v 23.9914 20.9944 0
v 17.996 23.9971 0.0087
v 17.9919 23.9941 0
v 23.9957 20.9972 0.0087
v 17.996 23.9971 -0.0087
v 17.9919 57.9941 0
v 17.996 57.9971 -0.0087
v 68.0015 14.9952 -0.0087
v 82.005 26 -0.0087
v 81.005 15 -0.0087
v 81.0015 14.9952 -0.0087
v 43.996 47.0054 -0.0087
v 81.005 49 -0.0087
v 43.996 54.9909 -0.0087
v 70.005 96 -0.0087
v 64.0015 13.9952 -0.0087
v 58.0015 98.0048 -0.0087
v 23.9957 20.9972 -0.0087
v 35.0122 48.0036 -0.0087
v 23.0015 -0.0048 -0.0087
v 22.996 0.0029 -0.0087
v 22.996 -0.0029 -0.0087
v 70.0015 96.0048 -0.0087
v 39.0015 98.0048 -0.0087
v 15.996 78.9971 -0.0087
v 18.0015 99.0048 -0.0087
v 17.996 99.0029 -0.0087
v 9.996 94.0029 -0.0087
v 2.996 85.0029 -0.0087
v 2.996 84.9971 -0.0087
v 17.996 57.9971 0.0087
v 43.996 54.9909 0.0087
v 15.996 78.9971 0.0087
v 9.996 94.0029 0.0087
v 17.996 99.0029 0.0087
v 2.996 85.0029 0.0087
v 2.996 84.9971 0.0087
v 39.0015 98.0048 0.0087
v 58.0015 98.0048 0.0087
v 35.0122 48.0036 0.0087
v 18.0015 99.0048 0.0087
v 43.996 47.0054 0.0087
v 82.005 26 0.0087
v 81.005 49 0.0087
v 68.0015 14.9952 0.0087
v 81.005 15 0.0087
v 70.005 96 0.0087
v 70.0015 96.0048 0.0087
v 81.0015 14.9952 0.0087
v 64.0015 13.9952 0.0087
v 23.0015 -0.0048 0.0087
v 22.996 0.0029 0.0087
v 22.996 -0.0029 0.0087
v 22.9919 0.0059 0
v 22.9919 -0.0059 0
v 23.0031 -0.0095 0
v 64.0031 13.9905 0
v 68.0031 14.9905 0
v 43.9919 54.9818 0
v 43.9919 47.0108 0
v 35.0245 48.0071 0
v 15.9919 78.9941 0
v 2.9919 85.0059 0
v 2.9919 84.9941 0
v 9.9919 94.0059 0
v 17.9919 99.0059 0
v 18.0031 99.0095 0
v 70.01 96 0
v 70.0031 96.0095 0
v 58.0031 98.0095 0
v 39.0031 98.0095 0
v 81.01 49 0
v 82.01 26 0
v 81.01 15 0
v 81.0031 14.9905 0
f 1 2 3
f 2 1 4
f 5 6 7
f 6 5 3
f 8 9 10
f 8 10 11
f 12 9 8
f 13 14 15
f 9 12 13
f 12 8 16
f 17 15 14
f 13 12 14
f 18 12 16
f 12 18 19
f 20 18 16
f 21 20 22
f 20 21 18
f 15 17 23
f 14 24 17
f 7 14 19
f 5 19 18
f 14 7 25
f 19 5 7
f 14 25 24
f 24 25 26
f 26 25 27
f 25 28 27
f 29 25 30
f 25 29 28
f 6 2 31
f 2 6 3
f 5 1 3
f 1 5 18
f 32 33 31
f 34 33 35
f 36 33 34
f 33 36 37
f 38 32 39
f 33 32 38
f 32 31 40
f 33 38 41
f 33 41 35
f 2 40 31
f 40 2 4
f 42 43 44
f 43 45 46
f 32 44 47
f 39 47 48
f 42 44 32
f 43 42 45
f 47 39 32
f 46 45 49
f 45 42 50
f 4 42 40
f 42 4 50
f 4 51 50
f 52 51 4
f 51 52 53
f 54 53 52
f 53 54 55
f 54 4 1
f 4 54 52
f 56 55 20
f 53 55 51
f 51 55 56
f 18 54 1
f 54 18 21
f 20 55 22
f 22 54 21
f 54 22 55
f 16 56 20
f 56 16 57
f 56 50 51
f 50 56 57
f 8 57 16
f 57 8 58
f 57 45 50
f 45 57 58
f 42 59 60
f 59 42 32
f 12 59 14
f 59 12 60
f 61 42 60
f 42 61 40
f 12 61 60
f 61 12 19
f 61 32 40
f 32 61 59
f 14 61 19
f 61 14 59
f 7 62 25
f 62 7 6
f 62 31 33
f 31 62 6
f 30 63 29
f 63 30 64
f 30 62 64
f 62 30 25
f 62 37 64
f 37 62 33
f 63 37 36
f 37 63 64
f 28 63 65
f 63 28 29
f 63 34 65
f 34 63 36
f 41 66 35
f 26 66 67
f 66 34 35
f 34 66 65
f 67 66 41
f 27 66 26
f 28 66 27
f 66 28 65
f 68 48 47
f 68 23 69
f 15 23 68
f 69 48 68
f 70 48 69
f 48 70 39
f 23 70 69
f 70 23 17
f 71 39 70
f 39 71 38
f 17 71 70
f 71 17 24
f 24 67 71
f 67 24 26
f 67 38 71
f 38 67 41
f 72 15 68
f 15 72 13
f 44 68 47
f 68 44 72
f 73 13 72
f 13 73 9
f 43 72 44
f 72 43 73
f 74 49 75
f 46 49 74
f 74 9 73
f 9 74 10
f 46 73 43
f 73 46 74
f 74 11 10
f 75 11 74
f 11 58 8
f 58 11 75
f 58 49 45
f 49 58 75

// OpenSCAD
color([0.5839405385485582,0.4048698908705002,0.6877557316706271]) hull(){
    translate([26,22]) sphere(0.01);
    translate([24,21]) sphere(0.01);
    translate([18,24]) sphere(0.01);
}
color([0.29310936231965135,0.08456113000314536,0.6409271470126323]) hull(){
    translate([23,0]) sphere(0.01);
    translate([24,21]) sphere(0.01);
    translate([26,22]) sphere(0.01);
}
color([0.38512246522478266,0.6162859510128613,0.407224705538046]) hull(){
    translate([23,0]) sphere(0.01);
    translate([26,22]) sphere(0.01);
    translate([42,29]) sphere(0.01);
}
color([0.6107800780239486,0.9541913078580654,0.09369719926319908]) hull(){
    translate([23,0]) sphere(0.01);
    translate([42,29]) sphere(0.01);
    translate([64,14]) sphere(0.01);
}
color([0.4396226851829427,0.9817497074141792,0.30111933510979894]) hull(){
    translate([64,14]) sphere(0.01);
    translate([42,29]) sphere(0.01);
    translate([58,33]) sphere(0.01);
}
color([0.08571041628526821,0.691130580335744,0.16573157374072334]) hull(){
    translate([64,14]) sphere(0.01);
    translate([58,33]) sphere(0.01);
    translate([68,15]) sphere(0.01);
}
color([0.4668304924867862,0.30100213617539295,0.3511677492745029]) hull(){
    translate([68,15]) sphere(0.01);
    translate([58,33]) sphere(0.01);
    translate([72,20]) sphere(0.01);
}
color([0.05564944269037686,0.7696481469448815,0.686275624239137]) hull(){
    translate([72,20]) sphere(0.01);
    translate([58,33]) sphere(0.01);
    translate([82,26]) sphere(0.01);
}
color([0.15447252119296884,0.35335085758162643,0.18799175914388588]) hull(){
    translate([82,26]) sphere(0.01);
    translate([58,33]) sphere(0.01);
    translate([77,50]) sphere(0.01);
}
color([0.41322879780265653,0.82270842281296,0.9057146612667819]) hull(){
    translate([58,33]) sphere(0.01);
    translate([44,55]) sphere(0.01);
    translate([77,50]) sphere(0.01);
}
color([0.9688547633127277,0.5528378273263655,0.12760284187612392]) hull(){
    translate([58,33]) sphere(0.01);
    translate([44,47]) sphere(0.01);
    translate([44,55]) sphere(0.01);
}
color([0.1710979555253146,0.7131998843266452,0.6397779425125977]) hull(){
    translate([58,33]) sphere(0.01);
    translate([42,29]) sphere(0.01);
    translate([44,47]) sphere(0.01);
}
color([0.57496968906483,0.8489371230716904,0.07944838941339594]) hull(){
    translate([42,29]) sphere(0.01);
    translate([35,48]) sphere(0.01);
    translate([44,47]) sphere(0.01);
}
color([0.040333123224873146,0.9305910632054132,0.3080440975445232]) hull(){
    translate([42,29]) sphere(0.01);
    translate([26,22]) sphere(0.01);
    translate([35,48]) sphere(0.01);
}
color([0.6084655882345898,0.4923441190446234,0.7069385087242315]) hull(){
    translate([26,22]) sphere(0.01);
    translate([26,51]) sphere(0.01);
    translate([35,48]) sphere(0.01);
}
color([0.6803385961846494,0.18024793645131376,0.10787678186317007]) hull(){
    translate([26,22]) sphere(0.01);
    translate([18,24]) sphere(0.01);
    translate([26,51]) sphere(0.01);
}
color([0.1335624130282893,0.47731112778056706,0.8393950916733898]) hull(){
    translate([18,24]) sphere(0.01);
    translate([18,58]) sphere(0.01);
    translate([26,51]) sphere(0.01);
}
color([0.6780893207968227,0.08337096158279222,0.27725115680544954]) hull(){
    translate([26,51]) sphere(0.01);
    translate([30,57]) sphere(0.01);
    translate([35,48]) sphere(0.01);
}
color([0.9965791662073833,0.03375154870506614,0.10494976972159242]) hull(){
    translate([26,51]) sphere(0.01);
    translate([18,58]) sphere(0.01);
    translate([30,57]) sphere(0.01);
}
color([0.516844917539197,0.1360610465034362,0.543805910213663]) hull(){
    translate([30,57]) sphere(0.01);
    translate([44,55]) sphere(0.01);
    translate([35,48]) sphere(0.01);
}
color([0.04901628196141694,0.4867102513994055,0.8813892002857401]) hull(){
    translate([18,58]) sphere(0.01);
    translate([16,79]) sphere(0.01);
    translate([30,57]) sphere(0.01);
}
color([0.3053751014353143,0.40772022041766365,0.31297204198076634]) hull(){
    translate([30,57]) sphere(0.01);
    translate([16,79]) sphere(0.01);
    translate([44,55]) sphere(0.01);
}
color([0.49907796034366436,0.6160709555012981,0.9916538905911245]) hull(){
    translate([16,79]) sphere(0.01);
    translate([20,83]) sphere(0.01);
    translate([44,55]) sphere(0.01);
}
color([0.3123575451593331,0.46364206475662195,0.8862899719975306]) hull(){
    translate([16,79]) sphere(0.01);
    translate([6,84]) sphere(0.01);
    translate([20,83]) sphere(0.01);
}
color([0.5738800220993816,0.8494037217359881,0.24323676398212035]) hull(){
    translate([16,79]) sphere(0.01);
    translate([3,85]) sphere(0.01);
    translate([6,84]) sphere(0.01);
}
color([0.8402878098664139,0.9530478541805099,0.16594803365564914]) hull(){
    translate([6,84]) sphere(0.01);
    translate([10,94]) sphere(0.01);
    translate([3,85]) sphere(0.01);
}
color([0.0023370868964924796,0.7387895340607371,0.5374530602666081]) hull(){
    translate([6,84]) sphere(0.01);
    translate([18,99]) sphere(0.01);
    translate([10,94]) sphere(0.01);
}
color([0.25604025835089217,0.4320068924153808,0.5112453323210508]) hull(){
    translate([6,84]) sphere(0.01);
    translate([22,90]) sphere(0.01);
    translate([18,99]) sphere(0.01);
}
color([0.7462272619347637,0.5039790716190428,0.8850839351693509]) hull(){
    translate([6,84]) sphere(0.01);
    translate([20,83]) sphere(0.01);
    translate([22,90]) sphere(0.01);
}
color([0.6652757233710683,0.22263754843686523,0.08942086350367451]) hull(){
    translate([20,83]) sphere(0.01);
    translate([50,93]) sphere(0.01);
    translate([22,90]) sphere(0.01);
}
color([0.6195232841458308,0.9036720387350747,0.7222923954673625]) hull(){
    translate([20,83]) sphere(0.01);
    translate([44,55]) sphere(0.01);
    translate([50,93]) sphere(0.01);
}
color([0.6665075097113882,0.5421139713900744,0.6943978877819516]) hull(){
    translate([44,55]) sphere(0.01);
    translate([59,71]) sphere(0.01);
    translate([50,93]) sphere(0.01);
}
color([0.9269770591996176,0.12480324665016229,0.8422397758241813]) hull(){
    translate([44,55]) sphere(0.01);
    translate([77,50]) sphere(0.01);
    translate([59,71]) sphere(0.01);
}
color([0.028249143050612435,0.8554899328562455,0.6212809598996976]) hull(){
    translate([50,93]) sphere(0.01);
    translate([59,71]) sphere(0.01);
    translate([70,96]) sphere(0.01);
}
color([0.6435486749275994,0.4857227915978113,0.2898251547629681]) hull(){
    translate([50,93]) sphere(0.01);
    translate([70,96]) sphere(0.01);
    translate([58,98]) sphere(0.01);
}
color([0.21709076393122206,0.4979948584580751,0.6176241526046676]) hull(){
    translate([50,93]) sphere(0.01);
    translate([58,98]) sphere(0.01);
    translate([39,98]) sphere(0.01);
}
color([0.4722249532281336,0.7228331534363125,0.6109414561657331]) hull(){
    translate([50,93]) sphere(0.01);
    translate([39,98]) sphere(0.01);
    translate([22,90]) sphere(0.01);
}
color([0.5330085163671737,0.6769359871291822,0.5973748769978083]) hull(){
    translate([22,90]) sphere(0.01);
    translate([39,98]) sphere(0.01);
    translate([18,99]) sphere(0.01);
}
color([0.14460255854654236,0.21273280877313017,0.8417179364881341]) hull(){
    translate([59,71]) sphere(0.01);
    translate([80,52]) sphere(0.01);
    translate([70,96]) sphere(0.01);
}
color([0.6300391880279899,0.5103677782275869,0.4479627161837708]) hull(){
    translate([59,71]) sphere(0.01);
    translate([77,50]) sphere(0.01);
    translate([80,52]) sphere(0.01);
}
color([0.2903518628620462,0.1744676713524972,0.5457372127765215]) hull(){
    translate([80,52]) sphere(0.01);
    translate([77,50]) sphere(0.01);
    translate([81,49]) sphere(0.01);
}
color([0.6340658375422632,0.7004271366493812,0.690956934786038]) hull(){
    translate([70,96]) sphere(0.01);
    translate([80,52]) sphere(0.01);
    translate([81,49]) sphere(0.01);
}
color([0.013948469234104865,0.8018456354370093,0.2607079205191076]) hull(){
    translate([77,50]) sphere(0.01);
    translate([82,26]) sphere(0.01);
    translate([81,49]) sphere(0.01);
}
color([0.01899716010339858,0.7507132946374245,0.44168653561511173]) hull(){
    translate([82,26]) sphere(0.01);
    translate([72,20]) sphere(0.01);
    translate([81,15]) sphere(0.01);
}
color([0.1668653701245908,0.45955837321901094,0.7876756969907556]) hull(){
    translate([82,26]) sphere(0.01);
    translate([81,15]) sphere(0.01);
    translate([81,49]) sphere(0.01);
}
color([0.09564527702692727,0.06733136152719421,0.7816649665975636]) hull(){
    translate([81,15]) sphere(0.01);
    translate([68,15]) sphere(0.01);
    translate([72,20]) sphere(0.01);
}
